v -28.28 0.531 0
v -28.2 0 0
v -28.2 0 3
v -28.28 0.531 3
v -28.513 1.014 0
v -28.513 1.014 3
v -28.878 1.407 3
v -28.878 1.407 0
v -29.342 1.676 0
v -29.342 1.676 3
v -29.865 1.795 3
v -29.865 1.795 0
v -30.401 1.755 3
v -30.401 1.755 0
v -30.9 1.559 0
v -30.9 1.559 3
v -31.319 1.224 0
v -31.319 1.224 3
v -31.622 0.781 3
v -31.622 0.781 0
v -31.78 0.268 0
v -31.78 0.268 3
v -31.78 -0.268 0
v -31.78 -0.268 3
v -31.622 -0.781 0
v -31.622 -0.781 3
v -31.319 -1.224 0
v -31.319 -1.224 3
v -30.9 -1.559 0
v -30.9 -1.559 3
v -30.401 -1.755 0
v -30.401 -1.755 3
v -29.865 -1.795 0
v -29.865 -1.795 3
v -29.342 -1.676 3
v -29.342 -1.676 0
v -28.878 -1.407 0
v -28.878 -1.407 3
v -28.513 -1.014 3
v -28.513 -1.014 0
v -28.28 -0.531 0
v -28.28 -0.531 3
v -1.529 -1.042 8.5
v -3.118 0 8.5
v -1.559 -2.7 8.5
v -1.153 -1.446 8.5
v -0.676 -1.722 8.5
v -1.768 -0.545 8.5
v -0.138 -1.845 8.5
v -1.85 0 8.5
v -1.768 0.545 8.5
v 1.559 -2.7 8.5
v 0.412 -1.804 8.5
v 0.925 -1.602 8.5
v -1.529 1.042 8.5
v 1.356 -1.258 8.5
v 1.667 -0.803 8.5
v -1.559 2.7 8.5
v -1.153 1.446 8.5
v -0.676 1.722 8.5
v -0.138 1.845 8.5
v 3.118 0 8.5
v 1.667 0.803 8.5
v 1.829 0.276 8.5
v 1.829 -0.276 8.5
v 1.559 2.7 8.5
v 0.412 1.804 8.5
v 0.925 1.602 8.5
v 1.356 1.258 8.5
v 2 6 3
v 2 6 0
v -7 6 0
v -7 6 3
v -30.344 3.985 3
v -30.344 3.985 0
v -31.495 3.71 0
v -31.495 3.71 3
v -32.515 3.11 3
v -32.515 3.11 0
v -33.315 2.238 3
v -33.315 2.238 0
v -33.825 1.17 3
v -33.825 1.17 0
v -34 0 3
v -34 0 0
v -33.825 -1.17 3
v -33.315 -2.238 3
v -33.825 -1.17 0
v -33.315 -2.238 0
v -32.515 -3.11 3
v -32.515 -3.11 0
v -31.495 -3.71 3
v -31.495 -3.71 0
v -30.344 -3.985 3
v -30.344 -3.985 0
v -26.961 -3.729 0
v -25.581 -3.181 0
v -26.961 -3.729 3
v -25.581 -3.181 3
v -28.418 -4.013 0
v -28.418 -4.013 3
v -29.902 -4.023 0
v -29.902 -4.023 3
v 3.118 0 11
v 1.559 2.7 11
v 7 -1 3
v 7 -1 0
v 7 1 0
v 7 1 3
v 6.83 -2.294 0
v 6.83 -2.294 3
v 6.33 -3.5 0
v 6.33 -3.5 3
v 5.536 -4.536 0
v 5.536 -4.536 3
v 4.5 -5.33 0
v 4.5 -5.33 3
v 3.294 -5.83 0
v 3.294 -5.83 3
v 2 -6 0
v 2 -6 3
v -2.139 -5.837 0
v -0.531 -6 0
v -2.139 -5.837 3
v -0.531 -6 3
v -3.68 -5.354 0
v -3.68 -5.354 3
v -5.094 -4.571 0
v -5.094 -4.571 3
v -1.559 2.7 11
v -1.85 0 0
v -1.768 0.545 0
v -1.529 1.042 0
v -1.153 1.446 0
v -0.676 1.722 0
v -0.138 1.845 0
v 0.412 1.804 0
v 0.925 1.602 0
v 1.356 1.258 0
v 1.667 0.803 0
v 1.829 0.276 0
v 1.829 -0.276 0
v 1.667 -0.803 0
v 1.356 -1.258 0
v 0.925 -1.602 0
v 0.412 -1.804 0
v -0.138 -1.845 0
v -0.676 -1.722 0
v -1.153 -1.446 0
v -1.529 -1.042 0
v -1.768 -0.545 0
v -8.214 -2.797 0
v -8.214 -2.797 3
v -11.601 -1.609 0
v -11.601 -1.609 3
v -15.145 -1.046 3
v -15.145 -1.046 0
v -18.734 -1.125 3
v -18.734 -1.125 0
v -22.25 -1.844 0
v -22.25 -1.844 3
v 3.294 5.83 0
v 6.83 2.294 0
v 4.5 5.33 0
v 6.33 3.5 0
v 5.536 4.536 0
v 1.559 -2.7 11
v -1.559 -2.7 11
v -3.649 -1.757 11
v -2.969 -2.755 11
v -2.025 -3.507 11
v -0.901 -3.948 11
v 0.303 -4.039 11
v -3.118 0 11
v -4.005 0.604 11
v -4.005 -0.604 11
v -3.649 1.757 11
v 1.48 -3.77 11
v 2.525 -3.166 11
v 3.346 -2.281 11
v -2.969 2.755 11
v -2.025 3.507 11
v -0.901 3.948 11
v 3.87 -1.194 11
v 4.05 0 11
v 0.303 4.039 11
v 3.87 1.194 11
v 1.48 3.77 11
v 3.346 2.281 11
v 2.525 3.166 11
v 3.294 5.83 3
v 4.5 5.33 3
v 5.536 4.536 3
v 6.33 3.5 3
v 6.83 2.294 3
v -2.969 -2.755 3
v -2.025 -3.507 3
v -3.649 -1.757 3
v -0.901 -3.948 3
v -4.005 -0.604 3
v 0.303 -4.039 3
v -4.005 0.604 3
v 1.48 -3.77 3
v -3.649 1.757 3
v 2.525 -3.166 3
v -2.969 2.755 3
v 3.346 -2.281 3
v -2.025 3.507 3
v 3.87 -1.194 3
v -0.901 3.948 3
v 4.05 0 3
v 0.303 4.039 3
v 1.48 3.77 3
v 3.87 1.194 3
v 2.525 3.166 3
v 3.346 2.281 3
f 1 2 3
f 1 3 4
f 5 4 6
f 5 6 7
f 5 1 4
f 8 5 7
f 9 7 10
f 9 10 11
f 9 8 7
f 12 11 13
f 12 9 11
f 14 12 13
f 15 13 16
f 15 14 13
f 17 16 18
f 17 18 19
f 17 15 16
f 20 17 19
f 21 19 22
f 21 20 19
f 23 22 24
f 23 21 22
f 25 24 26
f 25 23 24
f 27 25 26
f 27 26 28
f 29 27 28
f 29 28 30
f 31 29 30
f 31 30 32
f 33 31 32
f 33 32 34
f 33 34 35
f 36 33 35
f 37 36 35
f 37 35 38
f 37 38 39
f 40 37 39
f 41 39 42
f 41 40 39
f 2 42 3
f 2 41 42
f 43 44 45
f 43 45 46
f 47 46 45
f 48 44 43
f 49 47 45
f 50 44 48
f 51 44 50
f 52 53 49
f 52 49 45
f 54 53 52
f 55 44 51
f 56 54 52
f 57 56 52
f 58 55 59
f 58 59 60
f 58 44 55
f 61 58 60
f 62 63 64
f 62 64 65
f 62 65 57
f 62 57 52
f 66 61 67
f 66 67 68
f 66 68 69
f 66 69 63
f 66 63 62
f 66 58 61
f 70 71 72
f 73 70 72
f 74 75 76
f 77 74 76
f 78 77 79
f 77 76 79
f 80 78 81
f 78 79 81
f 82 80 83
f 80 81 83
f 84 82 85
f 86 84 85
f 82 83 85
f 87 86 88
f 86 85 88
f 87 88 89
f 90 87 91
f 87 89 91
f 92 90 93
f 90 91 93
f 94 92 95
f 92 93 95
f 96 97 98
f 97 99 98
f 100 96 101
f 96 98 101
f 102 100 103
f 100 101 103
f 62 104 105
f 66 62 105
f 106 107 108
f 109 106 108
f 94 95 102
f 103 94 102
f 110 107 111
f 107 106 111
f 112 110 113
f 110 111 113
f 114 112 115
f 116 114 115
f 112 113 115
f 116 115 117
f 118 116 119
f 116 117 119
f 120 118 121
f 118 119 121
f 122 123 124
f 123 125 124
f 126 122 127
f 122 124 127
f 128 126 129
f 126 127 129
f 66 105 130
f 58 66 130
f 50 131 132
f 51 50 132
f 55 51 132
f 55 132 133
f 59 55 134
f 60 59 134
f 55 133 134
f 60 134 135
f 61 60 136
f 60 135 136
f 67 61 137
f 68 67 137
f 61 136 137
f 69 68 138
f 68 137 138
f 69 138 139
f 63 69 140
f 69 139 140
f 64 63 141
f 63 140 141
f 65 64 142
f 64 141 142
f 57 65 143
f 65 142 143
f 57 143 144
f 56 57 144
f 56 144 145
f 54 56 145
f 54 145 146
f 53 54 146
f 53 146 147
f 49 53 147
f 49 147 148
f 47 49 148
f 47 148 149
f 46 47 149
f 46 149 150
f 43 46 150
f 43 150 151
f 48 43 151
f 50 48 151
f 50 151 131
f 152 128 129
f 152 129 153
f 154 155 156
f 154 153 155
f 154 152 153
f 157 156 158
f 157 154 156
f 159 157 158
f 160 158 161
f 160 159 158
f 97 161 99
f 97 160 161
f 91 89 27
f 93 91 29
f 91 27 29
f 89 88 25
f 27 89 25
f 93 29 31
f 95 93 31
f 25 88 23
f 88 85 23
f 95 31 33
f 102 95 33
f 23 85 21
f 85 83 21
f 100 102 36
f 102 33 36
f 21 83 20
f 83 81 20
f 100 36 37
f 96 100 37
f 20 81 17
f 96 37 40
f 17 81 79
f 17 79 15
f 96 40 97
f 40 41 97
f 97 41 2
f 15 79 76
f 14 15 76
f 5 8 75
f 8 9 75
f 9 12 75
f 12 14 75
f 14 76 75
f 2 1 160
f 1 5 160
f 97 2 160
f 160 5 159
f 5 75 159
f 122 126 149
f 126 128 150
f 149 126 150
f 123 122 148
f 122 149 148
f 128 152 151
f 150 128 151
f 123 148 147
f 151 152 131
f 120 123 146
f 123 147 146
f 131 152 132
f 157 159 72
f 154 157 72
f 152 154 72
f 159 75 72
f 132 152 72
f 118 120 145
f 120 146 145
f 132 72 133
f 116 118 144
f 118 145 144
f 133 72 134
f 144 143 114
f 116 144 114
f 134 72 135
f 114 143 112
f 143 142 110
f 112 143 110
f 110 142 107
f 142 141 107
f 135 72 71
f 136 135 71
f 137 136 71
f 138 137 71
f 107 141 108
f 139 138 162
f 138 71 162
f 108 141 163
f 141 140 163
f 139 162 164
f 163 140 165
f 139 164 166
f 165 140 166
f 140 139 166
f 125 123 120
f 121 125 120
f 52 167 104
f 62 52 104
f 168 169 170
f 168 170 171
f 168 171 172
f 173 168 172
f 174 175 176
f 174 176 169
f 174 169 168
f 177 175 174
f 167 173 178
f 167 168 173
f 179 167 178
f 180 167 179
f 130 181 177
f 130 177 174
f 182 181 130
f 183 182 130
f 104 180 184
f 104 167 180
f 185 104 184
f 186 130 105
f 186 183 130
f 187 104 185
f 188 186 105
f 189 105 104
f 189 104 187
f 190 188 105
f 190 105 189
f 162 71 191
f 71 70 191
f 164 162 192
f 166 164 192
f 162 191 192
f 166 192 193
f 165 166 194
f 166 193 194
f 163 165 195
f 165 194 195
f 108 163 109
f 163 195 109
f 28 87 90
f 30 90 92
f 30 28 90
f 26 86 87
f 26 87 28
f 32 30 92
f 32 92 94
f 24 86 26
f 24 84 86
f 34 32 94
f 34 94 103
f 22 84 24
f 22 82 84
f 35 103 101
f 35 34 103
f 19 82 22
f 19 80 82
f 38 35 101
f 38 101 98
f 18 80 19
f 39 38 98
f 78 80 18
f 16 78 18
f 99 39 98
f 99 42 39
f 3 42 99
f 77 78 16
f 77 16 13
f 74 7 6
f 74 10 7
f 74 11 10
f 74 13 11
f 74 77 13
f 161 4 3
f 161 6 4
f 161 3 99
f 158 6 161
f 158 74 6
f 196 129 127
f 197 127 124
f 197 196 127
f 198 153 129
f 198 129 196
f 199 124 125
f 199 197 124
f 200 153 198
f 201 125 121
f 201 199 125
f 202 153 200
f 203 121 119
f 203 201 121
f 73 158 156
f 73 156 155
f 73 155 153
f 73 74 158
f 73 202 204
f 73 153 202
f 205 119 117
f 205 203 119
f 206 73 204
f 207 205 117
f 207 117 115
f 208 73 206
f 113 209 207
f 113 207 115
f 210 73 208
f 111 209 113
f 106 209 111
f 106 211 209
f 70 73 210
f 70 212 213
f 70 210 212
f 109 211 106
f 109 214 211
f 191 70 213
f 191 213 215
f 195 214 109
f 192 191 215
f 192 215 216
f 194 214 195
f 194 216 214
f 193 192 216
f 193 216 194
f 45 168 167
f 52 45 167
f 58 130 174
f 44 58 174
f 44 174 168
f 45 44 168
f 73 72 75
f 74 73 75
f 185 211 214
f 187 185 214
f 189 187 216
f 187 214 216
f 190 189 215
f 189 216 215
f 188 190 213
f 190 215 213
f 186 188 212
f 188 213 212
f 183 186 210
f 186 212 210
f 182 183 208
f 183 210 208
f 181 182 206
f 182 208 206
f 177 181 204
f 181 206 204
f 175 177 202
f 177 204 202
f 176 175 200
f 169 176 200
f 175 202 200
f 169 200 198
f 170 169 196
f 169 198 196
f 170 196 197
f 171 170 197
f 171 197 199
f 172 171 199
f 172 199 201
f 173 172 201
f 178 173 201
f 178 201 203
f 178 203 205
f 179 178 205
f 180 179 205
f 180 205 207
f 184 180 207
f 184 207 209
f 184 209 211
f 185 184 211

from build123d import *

# Parameters (mm, degrees)
SKETCH1_R               = 4.05
SKETCH1_R_2             = 1.8
BOSS_EXTRUDE1_DEPTH     = 3
SKETCH1_2_R             = 4.05
BOSS_EXTRUDE2_DEPTH     = 11
FILLET1_R               = 5
SKETCH2_R               = 1.85
CUT_EXTRUDE1_DEPTH      = 37.235341864
CUT_EXTRUDE2_DEPTH      = 2.5
CUT_EXTRUDE3_DEPTH      = 36.440090293
CUT_EXTRUDE3_DEPTH_BACK = 36.440090293
FILLET2_R               = 8


with BuildPart() as part:
    # Sketch1 → Boss-Extrude1 (new body)
    with BuildSketch(Plane.XY):
        with BuildLine():
            Line((-7, 6), (-30.343961021, 3.985183912))
            ThreePointArc((-30.343961021, 3.985183912), (-34, 0), (-30.343961021, -3.985183912))
            Line((-30.343961021, -3.985183912), (-7, -6))
            Line((-7, -6), (7, -6))
            Line((7, -6), (7, 6))
            Line((7, 6), (-7, 6))
        make_face()
        Circle(SKETCH1_R, mode=Mode.SUBTRACT)
        with Locations((-30, 0)):
            Circle(SKETCH1_R_2, mode=Mode.SUBTRACT)
    extrude(amount=BOSS_EXTRUDE1_DEPTH)

    # Sketch1<2> → Boss-Extrude2 (add)
    with BuildSketch(Plane.XY):
        Circle(SKETCH1_2_R)
    extrude(amount=BOSS_EXTRUDE2_DEPTH)

    # Fillet1
    fillet1_edges = [part.edges().sort_by_distance(p)[0] for p in [
        (7, 6, 1.5),
        (7, -6, 1.5),
    ]]
    fillet(fillet1_edges, radius=FILLET1_R)

    # Sketch2 → Cut-Extrude1 (cut, through all)
    with BuildSketch(Plane(origin=(0, 0, 0), x_dir=(-1, 0, 0), z_dir=(0, 0, -1))):
        Circle(SKETCH2_R)
    extrude(amount=-CUT_EXTRUDE1_DEPTH, mode=Mode.SUBTRACT)

    # Sketch3 → Cut-Extrude2 (cut)
    with BuildSketch(Plane.XY.offset(11)):
        Polygon((1.558845727, 2.7), (-1.558845727, 2.7), (-3.117691454, 0), (-1.558845727, -2.7), (1.558845727, -2.7), (3.117691454, 0), align=None)
    extrude(amount=-CUT_EXTRUDE2_DEPTH, mode=Mode.SUBTRACT)

    # Sketch5 → Cut-Extrude3 (cut, two sides: drawn at the far end of the back side and taken through both)
    with BuildSketch(Plane.XY.offset(3).offset(-CUT_EXTRUDE3_DEPTH_BACK)):
        with BuildLine():
            Line((-27.410855082, -4.238340137), (-7, -6))
            Line((-7, -6), (-3.277962863, -6))
            Line((-3.277962863, -6), (-3.271243445, -6))
            ThreePointArc((-3.271243445, -6), (-15.044311785, -1.053046052), (-27.410855082, -4.238340137))
        make_face()
    extrude(amount=CUT_EXTRUDE3_DEPTH + CUT_EXTRUDE3_DEPTH_BACK, mode=Mode.SUBTRACT)

    # Fillet2
    fillet2_edges = [part.edges().sort_by_distance(p)[0] for p in [
        (-27.410855082, -4.238340137, 1.5),
        (-3.271243445, -6, 1.5),
    ]]
    fillet(fillet2_edges, radius=FILLET2_R)


solid = part.part
